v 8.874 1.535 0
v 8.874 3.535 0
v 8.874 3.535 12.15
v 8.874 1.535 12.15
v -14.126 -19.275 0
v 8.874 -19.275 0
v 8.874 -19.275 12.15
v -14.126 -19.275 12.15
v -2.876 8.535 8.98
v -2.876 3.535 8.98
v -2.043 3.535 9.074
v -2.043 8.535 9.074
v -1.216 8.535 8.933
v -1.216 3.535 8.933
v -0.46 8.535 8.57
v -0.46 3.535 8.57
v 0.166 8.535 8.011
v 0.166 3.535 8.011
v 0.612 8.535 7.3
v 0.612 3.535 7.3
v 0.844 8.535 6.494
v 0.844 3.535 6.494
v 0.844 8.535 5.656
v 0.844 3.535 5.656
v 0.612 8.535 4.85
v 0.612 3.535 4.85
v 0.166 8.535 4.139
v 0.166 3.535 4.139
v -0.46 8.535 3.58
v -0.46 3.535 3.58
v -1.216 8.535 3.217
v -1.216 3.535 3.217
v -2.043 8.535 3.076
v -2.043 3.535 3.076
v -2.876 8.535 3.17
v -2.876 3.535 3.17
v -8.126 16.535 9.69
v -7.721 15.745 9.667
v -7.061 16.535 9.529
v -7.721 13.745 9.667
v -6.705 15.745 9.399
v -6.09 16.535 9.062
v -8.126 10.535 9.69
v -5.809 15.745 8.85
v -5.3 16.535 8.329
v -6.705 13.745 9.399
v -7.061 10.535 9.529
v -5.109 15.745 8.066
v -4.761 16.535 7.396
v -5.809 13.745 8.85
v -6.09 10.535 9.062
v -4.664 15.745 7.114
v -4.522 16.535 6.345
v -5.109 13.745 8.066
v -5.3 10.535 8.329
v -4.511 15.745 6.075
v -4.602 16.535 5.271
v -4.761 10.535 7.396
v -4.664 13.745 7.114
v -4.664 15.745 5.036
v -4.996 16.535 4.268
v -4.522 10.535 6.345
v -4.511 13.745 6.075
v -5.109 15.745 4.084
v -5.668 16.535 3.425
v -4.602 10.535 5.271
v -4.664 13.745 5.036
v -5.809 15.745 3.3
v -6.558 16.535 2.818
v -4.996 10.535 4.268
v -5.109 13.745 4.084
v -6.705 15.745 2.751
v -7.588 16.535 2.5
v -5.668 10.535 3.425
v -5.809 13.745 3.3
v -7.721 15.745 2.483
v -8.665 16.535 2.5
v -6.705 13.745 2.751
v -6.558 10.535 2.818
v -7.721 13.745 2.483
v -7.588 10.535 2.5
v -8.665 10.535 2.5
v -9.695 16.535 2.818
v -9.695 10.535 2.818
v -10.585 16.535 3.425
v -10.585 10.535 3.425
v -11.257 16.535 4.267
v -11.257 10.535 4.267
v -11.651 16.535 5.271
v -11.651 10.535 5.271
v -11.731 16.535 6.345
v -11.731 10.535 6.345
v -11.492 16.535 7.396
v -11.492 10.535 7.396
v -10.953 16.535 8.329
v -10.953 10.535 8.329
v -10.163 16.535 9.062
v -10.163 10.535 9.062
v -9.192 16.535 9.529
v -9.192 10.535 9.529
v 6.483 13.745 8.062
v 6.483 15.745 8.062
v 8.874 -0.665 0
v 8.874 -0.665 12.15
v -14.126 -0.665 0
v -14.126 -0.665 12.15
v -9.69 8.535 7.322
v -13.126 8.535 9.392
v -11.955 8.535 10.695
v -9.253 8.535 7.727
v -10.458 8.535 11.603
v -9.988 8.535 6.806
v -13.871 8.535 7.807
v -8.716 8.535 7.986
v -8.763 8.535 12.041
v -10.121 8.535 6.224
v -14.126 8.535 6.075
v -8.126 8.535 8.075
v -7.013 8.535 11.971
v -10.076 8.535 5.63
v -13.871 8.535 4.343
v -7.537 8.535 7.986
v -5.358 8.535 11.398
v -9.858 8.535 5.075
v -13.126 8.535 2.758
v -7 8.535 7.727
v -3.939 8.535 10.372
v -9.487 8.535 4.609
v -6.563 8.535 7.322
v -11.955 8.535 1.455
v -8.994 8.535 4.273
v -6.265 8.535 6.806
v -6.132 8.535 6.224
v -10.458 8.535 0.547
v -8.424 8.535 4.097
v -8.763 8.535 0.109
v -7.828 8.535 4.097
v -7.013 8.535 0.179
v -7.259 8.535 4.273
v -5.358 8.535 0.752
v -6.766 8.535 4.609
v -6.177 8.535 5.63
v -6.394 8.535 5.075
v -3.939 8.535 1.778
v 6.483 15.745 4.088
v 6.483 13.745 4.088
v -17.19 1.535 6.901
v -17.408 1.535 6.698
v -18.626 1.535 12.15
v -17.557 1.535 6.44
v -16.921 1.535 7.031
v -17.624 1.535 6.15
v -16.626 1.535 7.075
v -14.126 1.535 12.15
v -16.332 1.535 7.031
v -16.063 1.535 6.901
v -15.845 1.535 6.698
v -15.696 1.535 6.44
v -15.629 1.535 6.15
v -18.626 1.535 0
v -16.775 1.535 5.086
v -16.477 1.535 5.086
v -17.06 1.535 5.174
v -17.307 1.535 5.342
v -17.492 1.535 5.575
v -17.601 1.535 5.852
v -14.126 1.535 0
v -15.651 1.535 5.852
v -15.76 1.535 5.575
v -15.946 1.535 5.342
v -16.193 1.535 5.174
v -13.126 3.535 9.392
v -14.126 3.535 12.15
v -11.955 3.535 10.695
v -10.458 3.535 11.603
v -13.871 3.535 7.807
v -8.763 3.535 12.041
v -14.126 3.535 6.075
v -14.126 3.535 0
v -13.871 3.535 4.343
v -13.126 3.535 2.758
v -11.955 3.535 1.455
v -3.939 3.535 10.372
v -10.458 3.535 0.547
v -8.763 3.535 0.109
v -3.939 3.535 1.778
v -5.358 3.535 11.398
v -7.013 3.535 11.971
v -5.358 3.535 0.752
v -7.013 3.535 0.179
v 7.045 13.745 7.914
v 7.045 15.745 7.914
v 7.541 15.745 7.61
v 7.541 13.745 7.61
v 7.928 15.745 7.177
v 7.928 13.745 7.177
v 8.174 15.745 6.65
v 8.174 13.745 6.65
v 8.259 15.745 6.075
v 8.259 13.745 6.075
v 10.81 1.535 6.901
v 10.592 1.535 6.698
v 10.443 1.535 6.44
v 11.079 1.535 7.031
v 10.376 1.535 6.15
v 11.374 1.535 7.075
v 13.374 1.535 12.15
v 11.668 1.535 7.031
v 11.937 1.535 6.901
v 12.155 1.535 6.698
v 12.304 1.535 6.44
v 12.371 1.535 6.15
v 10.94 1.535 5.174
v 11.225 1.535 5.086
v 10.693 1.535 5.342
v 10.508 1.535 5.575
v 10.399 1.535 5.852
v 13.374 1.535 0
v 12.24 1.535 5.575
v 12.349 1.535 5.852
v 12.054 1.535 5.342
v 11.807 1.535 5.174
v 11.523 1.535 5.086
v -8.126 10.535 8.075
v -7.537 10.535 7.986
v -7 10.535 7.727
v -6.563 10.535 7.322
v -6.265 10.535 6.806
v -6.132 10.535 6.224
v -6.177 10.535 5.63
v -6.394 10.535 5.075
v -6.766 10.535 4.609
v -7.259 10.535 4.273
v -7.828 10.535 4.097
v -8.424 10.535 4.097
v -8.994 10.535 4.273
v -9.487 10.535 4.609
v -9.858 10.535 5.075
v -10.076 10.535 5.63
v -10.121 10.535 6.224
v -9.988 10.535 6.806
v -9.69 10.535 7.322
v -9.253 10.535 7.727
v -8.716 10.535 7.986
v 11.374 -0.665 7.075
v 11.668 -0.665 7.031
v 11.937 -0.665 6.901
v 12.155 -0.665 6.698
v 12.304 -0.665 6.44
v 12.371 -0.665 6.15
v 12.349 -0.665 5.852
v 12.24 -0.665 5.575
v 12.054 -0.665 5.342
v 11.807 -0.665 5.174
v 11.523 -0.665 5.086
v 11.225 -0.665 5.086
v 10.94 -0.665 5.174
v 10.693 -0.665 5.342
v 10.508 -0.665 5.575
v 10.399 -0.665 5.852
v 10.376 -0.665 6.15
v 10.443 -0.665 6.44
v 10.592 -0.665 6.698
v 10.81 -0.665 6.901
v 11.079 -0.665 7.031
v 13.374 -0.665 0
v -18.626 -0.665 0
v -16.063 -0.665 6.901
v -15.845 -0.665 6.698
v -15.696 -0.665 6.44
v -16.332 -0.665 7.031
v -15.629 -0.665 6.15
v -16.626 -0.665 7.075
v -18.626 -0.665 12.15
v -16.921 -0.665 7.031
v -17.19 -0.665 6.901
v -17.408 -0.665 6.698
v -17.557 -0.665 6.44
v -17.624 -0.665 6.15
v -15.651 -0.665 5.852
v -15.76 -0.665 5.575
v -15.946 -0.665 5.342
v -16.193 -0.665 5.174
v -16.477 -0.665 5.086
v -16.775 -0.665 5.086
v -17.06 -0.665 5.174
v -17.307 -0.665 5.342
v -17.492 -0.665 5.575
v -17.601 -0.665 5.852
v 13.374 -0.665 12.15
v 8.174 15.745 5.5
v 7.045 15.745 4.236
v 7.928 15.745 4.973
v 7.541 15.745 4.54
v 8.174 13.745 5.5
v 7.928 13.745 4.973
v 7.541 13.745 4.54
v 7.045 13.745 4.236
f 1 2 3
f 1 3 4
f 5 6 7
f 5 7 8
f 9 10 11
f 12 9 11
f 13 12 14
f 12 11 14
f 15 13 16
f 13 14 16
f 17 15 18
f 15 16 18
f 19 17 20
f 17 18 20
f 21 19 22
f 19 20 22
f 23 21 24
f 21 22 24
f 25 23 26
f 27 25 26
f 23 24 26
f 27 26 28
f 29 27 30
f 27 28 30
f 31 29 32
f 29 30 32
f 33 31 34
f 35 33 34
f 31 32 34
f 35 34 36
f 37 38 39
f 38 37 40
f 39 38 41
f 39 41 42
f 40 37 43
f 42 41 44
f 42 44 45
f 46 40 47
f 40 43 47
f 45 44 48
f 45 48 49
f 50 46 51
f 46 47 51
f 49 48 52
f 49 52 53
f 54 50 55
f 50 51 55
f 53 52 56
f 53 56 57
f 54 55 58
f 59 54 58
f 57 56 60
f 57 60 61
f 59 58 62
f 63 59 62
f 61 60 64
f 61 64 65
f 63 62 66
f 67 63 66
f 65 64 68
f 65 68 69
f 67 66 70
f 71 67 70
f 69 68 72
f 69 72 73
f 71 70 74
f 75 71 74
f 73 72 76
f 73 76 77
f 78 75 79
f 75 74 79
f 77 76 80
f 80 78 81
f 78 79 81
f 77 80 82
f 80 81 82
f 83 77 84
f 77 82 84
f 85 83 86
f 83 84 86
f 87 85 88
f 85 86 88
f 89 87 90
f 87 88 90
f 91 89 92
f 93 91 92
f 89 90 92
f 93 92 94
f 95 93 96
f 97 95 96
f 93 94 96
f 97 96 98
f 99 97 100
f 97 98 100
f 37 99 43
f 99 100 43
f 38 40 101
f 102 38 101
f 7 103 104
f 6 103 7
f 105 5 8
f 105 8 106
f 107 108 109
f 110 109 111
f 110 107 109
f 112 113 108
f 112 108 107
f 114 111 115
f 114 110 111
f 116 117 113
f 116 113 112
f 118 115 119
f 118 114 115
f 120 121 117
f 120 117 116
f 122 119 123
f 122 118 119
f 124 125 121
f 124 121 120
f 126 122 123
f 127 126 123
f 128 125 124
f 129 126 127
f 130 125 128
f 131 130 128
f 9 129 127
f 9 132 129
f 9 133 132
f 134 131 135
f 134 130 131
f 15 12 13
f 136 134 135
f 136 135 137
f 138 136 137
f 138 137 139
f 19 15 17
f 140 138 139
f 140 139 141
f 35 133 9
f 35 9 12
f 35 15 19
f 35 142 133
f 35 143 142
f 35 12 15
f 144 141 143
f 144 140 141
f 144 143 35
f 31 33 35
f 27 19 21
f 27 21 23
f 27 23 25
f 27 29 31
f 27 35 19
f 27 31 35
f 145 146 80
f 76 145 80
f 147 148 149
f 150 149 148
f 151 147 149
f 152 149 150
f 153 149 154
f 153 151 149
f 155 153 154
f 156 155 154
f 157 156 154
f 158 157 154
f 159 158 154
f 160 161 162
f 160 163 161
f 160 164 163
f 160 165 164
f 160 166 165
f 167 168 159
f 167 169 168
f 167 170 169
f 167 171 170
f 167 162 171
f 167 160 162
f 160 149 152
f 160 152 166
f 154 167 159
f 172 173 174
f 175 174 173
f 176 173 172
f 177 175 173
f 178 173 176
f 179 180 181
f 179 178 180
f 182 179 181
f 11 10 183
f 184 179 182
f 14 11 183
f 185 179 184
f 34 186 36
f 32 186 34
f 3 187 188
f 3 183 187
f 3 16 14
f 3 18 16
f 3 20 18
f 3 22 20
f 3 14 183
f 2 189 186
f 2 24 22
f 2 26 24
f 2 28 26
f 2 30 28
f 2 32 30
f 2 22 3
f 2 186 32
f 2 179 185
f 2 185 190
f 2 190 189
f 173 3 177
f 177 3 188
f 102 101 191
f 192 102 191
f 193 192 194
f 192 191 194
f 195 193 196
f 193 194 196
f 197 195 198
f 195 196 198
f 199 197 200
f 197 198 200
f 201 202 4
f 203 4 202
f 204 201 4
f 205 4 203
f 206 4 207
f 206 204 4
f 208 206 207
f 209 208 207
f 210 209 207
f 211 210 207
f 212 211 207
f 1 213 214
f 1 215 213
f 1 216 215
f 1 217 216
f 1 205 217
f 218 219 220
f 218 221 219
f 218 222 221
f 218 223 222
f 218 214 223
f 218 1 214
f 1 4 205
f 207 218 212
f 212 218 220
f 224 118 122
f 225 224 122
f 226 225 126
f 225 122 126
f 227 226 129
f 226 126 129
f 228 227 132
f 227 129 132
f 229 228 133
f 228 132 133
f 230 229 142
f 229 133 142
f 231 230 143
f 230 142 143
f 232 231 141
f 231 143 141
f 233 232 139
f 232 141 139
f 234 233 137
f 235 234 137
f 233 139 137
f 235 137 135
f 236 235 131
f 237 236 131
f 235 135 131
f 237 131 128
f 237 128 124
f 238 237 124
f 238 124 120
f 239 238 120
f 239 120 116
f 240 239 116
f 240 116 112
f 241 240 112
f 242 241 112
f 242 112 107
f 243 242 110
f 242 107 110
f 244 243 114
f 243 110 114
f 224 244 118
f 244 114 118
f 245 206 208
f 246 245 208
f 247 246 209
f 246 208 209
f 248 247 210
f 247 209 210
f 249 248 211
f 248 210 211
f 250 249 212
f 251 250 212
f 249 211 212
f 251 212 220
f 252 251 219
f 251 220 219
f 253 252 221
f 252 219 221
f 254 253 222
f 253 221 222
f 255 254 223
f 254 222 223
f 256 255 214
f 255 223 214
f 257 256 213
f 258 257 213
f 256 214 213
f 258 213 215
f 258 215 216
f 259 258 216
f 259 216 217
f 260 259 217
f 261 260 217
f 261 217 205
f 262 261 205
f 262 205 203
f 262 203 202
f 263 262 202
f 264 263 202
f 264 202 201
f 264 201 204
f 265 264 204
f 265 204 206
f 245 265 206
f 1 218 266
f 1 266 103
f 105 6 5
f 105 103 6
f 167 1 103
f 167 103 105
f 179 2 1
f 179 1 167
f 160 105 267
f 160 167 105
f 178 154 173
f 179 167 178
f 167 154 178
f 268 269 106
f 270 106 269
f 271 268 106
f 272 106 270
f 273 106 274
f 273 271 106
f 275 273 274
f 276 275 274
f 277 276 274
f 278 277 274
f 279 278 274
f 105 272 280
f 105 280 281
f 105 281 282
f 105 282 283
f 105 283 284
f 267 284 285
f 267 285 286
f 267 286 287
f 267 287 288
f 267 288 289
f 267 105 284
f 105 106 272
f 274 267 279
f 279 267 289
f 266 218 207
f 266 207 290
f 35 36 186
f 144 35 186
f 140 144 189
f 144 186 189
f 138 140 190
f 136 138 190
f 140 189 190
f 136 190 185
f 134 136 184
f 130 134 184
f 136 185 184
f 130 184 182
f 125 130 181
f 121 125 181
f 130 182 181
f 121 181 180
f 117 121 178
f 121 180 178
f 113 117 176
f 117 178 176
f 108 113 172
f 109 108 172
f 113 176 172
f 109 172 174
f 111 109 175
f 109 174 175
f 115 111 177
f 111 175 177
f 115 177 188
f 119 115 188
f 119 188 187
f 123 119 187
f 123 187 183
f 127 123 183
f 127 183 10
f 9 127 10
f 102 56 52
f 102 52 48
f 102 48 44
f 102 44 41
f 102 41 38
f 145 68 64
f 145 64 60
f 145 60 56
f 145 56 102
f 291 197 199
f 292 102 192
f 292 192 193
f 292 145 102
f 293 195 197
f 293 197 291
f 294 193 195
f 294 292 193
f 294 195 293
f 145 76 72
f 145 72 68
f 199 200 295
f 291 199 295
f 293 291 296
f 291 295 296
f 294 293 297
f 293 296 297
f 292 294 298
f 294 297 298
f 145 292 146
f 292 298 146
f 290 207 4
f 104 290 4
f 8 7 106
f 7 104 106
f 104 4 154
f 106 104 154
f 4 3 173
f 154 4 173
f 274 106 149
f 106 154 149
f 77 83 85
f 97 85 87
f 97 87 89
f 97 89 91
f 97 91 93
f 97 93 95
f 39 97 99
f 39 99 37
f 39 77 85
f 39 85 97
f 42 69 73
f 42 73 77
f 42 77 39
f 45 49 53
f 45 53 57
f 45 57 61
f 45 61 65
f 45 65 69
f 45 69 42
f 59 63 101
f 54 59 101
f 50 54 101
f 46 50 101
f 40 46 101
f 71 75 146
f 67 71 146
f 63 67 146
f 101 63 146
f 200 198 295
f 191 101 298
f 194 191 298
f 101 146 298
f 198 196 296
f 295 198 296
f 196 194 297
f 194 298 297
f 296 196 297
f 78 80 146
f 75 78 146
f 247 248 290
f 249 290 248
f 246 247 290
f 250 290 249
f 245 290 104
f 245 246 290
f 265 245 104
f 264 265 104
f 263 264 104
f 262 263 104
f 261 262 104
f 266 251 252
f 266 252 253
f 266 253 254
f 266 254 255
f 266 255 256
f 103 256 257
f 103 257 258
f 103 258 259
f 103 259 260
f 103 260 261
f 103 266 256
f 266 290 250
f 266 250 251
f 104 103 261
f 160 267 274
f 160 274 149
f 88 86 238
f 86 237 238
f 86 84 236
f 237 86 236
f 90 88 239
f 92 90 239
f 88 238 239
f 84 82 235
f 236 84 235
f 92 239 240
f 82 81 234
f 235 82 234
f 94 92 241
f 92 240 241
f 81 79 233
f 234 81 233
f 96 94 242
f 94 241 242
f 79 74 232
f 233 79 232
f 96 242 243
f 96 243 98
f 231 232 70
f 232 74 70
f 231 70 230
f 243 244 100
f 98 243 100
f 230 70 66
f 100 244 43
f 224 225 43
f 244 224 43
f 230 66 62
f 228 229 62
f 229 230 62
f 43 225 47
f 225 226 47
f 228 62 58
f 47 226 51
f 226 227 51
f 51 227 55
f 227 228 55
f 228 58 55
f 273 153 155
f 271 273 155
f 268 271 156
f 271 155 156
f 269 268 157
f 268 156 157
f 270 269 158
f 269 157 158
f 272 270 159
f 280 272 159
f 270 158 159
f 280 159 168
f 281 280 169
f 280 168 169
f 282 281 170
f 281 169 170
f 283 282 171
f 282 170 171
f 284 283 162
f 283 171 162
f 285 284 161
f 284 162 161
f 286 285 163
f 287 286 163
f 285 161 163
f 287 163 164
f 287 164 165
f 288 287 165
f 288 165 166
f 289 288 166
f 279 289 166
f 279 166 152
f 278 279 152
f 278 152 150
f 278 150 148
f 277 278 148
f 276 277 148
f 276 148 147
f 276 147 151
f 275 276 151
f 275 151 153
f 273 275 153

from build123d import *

# Parameters (mm, degrees)
BOSS_EXTRUDE1_DEPTH = 12.15
SKETCH4_R           = 1
CUT_EXTRUDE1_DEPTH  = 12.15
SKETCH5_R           = 6
SKETCH5_R_2         = 3
BOSS_EXTRUDE2_DEPTH = 5
SKETCH6_R           = 2
BOSS_EXTRUDE3_DEPTH = 2
SKETCH7_R           = 3.615
BOSS_EXTRUDE4_DEPTH = 6
BOSS_EXTRUDE5_START = -2.79
BOSS_EXTRUDE5_DEPTH = 2


with BuildPart() as part:
    # Sketch3 → Boss-Extrude1 (new body)
    with BuildSketch(Plane.XY):
        Polygon((8.87359736, -19.274521452), (-14.12640264, -19.274521452), (-14.12640264, -0.664521452), (-18.62640264, -0.664521452), (-18.62640264, 1.535478548), (-14.12640264, 1.535478548), (-14.12640264, 3.535478548), (8.87359736, 3.535478548), (8.87359736, 1.535478548), (13.37359736, 1.535478548), (13.37359736, -0.664521452), (8.87359736, -0.664521452), align=None)
    extrude(amount=BOSS_EXTRUDE1_DEPTH)

    # Sketch4 → Cut-Extrude1 (cut)
    with BuildSketch(Plane(origin=(0, 1.535478548, 0), x_dir=(1, 0, 0), z_dir=(0, 1, 0))):
        with Locations(Location((-16.62640264, -6.075, 0), (0, 0, 270))):
            Circle(SKETCH4_R)
        with Locations(Location((11.37359736, -6.075, 0), (0, 0, 270))):
            Circle(SKETCH4_R)
    extrude(amount=-CUT_EXTRUDE1_DEPTH, mode=Mode.SUBTRACT)

    # Sketch5 → Boss-Extrude2 (add)
    with BuildSketch(Plane(origin=(0, 3.535478548, 0), x_dir=(1, 0, 0), z_dir=(0, 1, 0))):
        with Locations((-8.12640264, -6.075)):
            Circle(SKETCH5_R)
        with Locations((-2.12640264, -6.075)):
            Circle(SKETCH5_R_2)
    extrude(amount=BOSS_EXTRUDE2_DEPTH)

    # Sketch6 → Boss-Extrude3 (add)
    with BuildSketch(Plane(origin=(0, 8.535478548, 0), x_dir=(1, 0, 0), z_dir=(0, 1, 0))):
        with Locations(Location((-8.12640264, -6.075, 0), (0, 0, 270))):
            Circle(SKETCH6_R)
    extrude(amount=BOSS_EXTRUDE3_DEPTH)

    # Sketch7 → Boss-Extrude4 (add)
    with BuildSketch(Plane(origin=(0, 10.535478548, 0), x_dir=(1, 0, 0), z_dir=(0, 1, 0))):
        with Locations(Location((-8.12640264, -6.075, 0), (0, 0, 270))):
            Circle(SKETCH7_R)
    extrude(amount=BOSS_EXTRUDE4_DEPTH)

    # Sketch8 → Boss-Extrude5 (add)
    with BuildSketch(Plane(origin=(0, 16.535478548, 0), x_dir=(1, 0, 0), z_dir=(0, 1, 0)).offset(BOSS_EXTRUDE5_START)):
        with BuildLine():
            ThreePointArc((-7.720547583, -2.482854865), (-5.430536264, -3.666571159), (-4.51140264, -6.075))
            Line((-4.51140264, -6.075), (4.25859736, -6.075))
            ThreePointArc((4.25859736, -6.075), (4.92613327, -4.583510995), (6.483136811, -4.087644462))
            Line((6.483136811, -4.087644462), (-7.720547583, -2.482854865))
        make_face()
        with BuildLine():
            Line((4.25859736, -6.075), (-4.51140264, -6.075))
            ThreePointArc((-4.51140264, -6.075), (-5.430536264, -8.483428841), (-7.720547583, -9.667145135))
            Line((-7.720547583, -9.667145135), (6.483136811, -8.062355538))
            ThreePointArc((6.483136811, -8.062355538), (4.92613327, -7.566489005), (4.25859736, -6.075))
        make_face()
        with BuildLine():
            ThreePointArc((6.483136811, -4.087644462), (4.92613327, -4.583510995), (4.25859736, -6.075))
            Line((4.25859736, -6.075), (8.25859736, -6.075))
            ThreePointArc((8.25859736, -6.075), (7.750086364, -4.742535911), (6.483136811, -4.087644462))
        make_face()
        with BuildLine():
            Line((8.25859736, -6.075), (4.25859736, -6.075))
            ThreePointArc((4.25859736, -6.075), (4.92613327, -7.566489005), (6.483136811, -8.062355538))
            ThreePointArc((6.483136811, -8.062355538), (7.750086364, -7.407464089), (8.25859736, -6.075))
        make_face()
    extrude(amount=BOSS_EXTRUDE5_DEPTH)


solid = part.part
